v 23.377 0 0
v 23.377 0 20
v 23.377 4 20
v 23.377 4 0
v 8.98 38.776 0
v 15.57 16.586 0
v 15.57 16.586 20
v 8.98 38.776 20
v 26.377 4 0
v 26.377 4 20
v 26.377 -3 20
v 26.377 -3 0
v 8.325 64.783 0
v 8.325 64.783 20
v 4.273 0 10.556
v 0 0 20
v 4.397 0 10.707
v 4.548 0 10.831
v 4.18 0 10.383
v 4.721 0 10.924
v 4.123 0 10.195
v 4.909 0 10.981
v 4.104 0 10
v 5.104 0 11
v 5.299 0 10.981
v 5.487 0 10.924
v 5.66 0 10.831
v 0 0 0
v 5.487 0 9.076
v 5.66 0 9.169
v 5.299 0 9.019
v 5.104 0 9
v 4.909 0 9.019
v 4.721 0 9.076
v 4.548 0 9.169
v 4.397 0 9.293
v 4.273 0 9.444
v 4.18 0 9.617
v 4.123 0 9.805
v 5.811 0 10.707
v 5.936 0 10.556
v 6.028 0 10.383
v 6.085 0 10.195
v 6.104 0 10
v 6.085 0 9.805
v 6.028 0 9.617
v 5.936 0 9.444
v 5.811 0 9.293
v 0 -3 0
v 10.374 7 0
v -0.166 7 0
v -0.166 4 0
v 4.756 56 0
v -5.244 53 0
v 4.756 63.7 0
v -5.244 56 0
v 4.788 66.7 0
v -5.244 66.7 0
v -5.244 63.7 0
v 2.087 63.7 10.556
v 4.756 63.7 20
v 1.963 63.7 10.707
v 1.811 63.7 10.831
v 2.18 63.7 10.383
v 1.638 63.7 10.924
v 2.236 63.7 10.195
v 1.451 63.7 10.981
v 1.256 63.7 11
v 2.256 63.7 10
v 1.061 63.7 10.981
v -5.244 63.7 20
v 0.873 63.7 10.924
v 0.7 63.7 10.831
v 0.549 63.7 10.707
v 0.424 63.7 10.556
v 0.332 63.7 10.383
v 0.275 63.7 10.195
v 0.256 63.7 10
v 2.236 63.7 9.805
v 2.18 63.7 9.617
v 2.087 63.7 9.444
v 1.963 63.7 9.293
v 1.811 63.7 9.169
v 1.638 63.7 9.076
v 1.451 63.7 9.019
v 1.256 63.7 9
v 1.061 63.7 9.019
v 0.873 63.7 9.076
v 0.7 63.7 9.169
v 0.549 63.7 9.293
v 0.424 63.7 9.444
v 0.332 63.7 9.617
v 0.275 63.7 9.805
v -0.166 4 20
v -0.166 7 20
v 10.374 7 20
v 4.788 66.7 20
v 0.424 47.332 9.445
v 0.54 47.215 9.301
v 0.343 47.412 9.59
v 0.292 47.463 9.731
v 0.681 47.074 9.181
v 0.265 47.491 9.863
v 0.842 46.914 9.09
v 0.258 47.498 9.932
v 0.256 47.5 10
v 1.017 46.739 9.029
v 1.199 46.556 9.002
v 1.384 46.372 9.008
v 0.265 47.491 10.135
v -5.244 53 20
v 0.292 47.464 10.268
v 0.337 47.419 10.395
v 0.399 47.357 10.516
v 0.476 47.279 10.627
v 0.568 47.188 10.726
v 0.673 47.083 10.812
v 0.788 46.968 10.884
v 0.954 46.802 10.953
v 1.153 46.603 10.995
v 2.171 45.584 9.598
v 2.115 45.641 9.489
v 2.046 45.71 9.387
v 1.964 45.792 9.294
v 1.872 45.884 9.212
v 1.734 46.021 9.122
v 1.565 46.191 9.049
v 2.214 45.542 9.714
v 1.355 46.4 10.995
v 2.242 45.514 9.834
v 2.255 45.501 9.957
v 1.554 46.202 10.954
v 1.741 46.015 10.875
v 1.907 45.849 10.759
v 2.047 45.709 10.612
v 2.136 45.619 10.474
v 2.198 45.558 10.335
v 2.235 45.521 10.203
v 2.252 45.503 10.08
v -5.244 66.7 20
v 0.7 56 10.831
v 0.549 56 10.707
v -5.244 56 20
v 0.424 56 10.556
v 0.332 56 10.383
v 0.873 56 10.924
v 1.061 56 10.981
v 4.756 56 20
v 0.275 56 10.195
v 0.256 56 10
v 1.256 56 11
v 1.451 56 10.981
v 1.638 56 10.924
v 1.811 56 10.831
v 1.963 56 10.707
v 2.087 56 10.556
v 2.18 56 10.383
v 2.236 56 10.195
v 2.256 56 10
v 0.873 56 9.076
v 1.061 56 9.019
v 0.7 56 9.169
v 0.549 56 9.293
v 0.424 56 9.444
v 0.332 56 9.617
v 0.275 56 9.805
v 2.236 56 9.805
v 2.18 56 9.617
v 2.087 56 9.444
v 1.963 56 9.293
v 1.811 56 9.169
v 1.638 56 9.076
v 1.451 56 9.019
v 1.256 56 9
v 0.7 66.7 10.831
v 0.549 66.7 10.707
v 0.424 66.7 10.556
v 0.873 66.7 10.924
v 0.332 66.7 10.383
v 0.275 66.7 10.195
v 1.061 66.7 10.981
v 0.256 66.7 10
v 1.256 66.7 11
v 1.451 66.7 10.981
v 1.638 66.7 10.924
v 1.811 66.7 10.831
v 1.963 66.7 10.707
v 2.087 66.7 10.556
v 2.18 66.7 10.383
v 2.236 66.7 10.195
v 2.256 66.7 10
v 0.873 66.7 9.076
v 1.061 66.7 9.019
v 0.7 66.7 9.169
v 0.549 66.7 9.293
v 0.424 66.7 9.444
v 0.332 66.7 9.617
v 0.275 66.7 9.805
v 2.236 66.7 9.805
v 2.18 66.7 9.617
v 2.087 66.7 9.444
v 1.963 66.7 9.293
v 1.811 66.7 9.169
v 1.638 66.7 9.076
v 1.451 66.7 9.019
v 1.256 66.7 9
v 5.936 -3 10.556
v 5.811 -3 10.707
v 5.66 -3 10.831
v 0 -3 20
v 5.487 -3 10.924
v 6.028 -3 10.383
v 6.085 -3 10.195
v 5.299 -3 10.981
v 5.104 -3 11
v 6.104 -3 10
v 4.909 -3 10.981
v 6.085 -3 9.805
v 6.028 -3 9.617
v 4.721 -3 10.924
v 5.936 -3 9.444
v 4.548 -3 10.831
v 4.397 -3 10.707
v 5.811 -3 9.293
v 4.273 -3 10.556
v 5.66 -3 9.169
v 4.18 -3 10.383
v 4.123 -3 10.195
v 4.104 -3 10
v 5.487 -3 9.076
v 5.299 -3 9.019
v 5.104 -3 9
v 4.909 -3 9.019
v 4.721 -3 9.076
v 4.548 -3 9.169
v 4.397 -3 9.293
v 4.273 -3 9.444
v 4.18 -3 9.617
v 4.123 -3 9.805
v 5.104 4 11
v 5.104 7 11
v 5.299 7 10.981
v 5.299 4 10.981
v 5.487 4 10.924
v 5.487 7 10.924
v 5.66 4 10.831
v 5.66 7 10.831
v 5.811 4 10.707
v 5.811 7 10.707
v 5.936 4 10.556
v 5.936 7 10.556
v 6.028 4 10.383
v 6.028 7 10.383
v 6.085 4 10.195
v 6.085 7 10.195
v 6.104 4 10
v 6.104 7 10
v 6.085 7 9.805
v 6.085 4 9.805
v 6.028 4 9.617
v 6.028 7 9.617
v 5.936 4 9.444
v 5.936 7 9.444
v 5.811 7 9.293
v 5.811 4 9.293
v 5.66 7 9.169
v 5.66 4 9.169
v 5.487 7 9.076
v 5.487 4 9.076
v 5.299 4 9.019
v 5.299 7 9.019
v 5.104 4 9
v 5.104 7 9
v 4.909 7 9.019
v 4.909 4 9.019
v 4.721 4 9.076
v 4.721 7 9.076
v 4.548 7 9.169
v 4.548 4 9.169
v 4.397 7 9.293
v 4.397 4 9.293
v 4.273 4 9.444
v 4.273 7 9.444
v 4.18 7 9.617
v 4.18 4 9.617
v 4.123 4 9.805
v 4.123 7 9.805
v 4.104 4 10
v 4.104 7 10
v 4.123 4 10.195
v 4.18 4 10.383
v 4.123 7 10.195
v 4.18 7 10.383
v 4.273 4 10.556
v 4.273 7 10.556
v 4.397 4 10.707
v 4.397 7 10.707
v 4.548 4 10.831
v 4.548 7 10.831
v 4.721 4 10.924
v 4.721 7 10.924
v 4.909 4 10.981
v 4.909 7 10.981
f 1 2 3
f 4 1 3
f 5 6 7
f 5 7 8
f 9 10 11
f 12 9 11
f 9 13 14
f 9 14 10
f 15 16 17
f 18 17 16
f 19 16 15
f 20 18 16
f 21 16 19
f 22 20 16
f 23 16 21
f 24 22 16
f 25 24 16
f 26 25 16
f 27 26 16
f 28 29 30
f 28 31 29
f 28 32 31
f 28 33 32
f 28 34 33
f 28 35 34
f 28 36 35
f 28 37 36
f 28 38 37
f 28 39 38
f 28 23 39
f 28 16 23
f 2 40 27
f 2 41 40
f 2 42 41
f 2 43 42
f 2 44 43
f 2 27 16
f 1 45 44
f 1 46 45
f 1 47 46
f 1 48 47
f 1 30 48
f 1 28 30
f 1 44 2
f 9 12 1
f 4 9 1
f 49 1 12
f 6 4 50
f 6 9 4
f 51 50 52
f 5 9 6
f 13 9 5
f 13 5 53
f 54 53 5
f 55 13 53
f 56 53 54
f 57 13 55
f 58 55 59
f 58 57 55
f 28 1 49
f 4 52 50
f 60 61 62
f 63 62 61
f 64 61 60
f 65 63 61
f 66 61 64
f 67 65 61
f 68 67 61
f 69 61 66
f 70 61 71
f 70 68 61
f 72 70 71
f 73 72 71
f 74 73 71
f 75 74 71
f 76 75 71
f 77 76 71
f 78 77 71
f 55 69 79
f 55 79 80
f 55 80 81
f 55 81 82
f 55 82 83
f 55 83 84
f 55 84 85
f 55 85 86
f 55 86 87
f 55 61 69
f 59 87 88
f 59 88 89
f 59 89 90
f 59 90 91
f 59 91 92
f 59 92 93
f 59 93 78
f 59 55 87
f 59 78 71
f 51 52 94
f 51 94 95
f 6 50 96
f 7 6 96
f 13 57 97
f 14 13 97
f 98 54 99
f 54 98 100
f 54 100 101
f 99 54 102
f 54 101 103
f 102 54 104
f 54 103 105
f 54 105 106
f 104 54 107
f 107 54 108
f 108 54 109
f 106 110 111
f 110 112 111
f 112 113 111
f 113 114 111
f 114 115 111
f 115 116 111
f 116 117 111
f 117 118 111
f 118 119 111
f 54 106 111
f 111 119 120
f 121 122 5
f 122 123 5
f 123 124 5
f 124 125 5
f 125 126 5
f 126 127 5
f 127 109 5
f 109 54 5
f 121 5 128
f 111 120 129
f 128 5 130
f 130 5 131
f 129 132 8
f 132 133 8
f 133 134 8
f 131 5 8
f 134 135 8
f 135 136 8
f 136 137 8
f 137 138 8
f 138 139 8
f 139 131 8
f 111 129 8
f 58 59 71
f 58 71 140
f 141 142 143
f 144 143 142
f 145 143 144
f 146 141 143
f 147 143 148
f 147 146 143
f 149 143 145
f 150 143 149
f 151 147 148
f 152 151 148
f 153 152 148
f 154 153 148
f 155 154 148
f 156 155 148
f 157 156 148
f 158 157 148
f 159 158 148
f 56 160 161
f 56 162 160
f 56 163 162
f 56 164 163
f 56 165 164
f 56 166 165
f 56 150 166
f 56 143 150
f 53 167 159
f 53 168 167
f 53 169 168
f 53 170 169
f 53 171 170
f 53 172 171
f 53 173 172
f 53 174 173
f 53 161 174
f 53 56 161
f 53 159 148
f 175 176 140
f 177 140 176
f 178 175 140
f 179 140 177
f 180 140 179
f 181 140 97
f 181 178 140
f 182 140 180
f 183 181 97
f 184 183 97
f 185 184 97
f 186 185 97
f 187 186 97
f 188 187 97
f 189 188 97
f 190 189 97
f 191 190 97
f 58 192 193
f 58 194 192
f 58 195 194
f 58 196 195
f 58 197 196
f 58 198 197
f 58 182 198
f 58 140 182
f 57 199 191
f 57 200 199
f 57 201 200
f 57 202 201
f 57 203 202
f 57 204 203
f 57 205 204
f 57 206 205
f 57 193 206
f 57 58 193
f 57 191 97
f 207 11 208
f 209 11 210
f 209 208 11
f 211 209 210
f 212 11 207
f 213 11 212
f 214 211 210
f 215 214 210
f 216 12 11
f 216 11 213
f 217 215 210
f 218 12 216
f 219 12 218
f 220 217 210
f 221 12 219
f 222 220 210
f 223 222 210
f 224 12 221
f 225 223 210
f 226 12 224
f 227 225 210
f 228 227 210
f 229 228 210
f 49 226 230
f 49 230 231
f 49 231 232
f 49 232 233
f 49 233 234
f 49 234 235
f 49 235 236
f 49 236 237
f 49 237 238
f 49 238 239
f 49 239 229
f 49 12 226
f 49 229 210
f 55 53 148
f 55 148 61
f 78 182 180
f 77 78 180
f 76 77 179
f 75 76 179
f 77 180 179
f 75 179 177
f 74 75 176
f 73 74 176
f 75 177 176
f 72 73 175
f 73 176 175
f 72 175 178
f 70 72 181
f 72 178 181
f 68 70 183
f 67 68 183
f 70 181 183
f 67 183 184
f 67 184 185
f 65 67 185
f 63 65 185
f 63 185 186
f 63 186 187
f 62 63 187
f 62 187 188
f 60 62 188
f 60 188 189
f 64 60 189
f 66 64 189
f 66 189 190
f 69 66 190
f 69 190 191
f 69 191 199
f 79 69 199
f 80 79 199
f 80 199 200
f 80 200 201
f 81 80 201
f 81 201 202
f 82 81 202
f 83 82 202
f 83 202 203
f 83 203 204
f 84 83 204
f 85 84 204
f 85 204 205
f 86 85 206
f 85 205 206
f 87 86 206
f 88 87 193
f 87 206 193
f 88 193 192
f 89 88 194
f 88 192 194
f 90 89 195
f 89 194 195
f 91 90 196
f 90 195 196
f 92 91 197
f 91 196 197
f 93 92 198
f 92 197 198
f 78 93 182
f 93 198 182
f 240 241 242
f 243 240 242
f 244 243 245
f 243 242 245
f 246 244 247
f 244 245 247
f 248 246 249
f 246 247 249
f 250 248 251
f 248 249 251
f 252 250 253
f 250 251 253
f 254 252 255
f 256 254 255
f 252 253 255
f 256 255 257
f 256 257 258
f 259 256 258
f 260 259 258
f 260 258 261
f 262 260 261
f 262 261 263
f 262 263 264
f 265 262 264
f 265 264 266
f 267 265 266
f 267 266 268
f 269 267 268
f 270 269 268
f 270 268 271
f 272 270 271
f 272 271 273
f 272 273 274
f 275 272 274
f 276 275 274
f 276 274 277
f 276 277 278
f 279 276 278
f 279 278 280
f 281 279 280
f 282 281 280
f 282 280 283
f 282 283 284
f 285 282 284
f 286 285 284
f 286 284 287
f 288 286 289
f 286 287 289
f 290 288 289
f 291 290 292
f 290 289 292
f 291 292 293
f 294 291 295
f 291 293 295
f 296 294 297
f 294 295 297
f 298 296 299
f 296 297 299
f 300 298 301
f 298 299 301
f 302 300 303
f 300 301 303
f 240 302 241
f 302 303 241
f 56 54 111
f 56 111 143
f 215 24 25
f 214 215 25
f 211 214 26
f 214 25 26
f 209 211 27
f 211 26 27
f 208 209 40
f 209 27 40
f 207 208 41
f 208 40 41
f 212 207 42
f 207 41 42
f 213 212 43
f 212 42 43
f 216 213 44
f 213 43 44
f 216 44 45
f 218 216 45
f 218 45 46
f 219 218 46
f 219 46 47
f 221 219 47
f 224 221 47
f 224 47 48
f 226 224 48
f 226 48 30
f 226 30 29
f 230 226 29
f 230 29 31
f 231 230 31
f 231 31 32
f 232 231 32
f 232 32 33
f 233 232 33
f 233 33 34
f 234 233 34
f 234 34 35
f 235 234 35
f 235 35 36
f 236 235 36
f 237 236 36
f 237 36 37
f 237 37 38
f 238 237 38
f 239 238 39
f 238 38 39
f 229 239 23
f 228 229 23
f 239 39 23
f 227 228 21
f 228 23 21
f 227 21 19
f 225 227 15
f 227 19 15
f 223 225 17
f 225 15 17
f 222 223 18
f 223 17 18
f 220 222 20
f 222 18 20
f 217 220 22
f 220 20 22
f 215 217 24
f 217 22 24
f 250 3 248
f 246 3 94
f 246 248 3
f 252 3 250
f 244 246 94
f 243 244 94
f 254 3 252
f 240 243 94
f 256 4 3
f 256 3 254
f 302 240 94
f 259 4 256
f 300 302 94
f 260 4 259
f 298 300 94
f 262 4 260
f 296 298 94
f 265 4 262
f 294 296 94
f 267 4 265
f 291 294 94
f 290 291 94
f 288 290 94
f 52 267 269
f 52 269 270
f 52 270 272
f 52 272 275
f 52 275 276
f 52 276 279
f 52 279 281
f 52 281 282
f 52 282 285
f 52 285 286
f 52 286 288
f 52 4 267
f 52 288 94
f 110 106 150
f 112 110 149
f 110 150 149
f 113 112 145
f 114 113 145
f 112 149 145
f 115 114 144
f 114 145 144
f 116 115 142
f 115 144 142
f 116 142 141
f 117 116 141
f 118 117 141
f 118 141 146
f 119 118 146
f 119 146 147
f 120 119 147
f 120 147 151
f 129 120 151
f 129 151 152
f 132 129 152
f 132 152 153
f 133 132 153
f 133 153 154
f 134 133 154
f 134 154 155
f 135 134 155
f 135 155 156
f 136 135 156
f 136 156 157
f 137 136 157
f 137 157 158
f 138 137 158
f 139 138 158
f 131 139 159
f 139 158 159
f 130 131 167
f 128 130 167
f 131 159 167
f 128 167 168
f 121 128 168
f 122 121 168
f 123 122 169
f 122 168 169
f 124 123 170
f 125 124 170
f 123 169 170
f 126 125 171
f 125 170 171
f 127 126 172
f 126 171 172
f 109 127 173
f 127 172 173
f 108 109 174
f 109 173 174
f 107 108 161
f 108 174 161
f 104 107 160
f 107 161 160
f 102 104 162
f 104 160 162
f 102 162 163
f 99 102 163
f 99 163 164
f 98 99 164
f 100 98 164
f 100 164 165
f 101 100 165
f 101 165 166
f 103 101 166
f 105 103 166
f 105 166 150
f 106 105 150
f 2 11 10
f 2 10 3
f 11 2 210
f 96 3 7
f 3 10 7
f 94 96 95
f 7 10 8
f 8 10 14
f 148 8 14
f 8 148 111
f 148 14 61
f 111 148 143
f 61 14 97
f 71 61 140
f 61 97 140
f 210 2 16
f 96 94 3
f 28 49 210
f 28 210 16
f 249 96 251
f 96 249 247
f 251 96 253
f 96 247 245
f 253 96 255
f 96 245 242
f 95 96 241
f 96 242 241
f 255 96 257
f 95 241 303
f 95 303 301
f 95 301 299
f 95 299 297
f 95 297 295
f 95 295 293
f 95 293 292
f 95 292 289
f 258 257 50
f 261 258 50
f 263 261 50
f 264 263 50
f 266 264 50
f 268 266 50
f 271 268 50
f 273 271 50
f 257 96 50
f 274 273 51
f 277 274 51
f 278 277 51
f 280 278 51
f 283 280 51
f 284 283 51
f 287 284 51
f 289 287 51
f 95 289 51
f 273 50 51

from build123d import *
from OCP.BRepFilletAPI import BRepFilletAPI_MakeChamfer

# Parameters (mm, degrees)
BOSS_EXTRUDE1_DEPTH = 20
CHAMFER1_SIZE       = 10
CHAMFER1_SIZE_2     = 14.838658038
CHAMFER1_SIZE_3     = 8.042998795
SKETCH2_R           = 1
CUT_EXTRUDE1_DEPTH  = 22
SKETCH3_R           = 1
CUT_EXTRUDE2_DEPTH  = 22
CHAMFER2_SIZE       = 2
CHAMFER2_SIZE2      = 2.967731608


with BuildPart() as part:
    # Sketch1 → Boss-Extrude1 (new body)
    with BuildSketch(Plane.XY):
        Polygon((0, 0), (23.377026873, 0), (23.377026873, 4), (-0.166134072, 4), (-0.166134072, 7), (4.755655282, 7), (18.417267614, 7), (4.755655282, 53), (-5.244344718, 53), (-5.244344718, 56), (4.755655282, 56), (4.755655282, 63.7), (-5.244344718, 63.7), (-5.244344718, 66.7), (7.755655282, 66.7), (26.377026873, 4), (26.377026873, -3), (0, -3), align=None)
    extrude(amount=BOSS_EXTRUDE1_DEPTH)

    # Chamfer1
    chamfer1_edges_1 = [part.edges().sort_by_distance(p)[0] for p in [
        (4.755655282, 53, 10),
    ]]
    chamfer1_side_1 = [part.faces().sort_by_distance(p)[0] for p in [
        (4.555655282, 53, 10),
    ]]
    chamfer1_edges_2 = [part.edges().sort_by_distance(p)[0] for p in [
        (18.417267614, 7, 10),
    ]]
    chamfer1_side_2 = [part.faces().sort_by_distance(p)[0] for p in [
        (18.37147062, 7.154203007, 10),
    ]]
    chamfer1 = BRepFilletAPI_MakeChamfer(part.part.solid().wrapped)
    for e in chamfer1_edges_1:
        chamfer1.Add(CHAMFER1_SIZE - 0.0001, CHAMFER1_SIZE_2 - 0.0001, e.wrapped, chamfer1_side_1[0].wrapped)
    for e in chamfer1_edges_2:
        chamfer1.Add(CHAMFER1_SIZE - 0.0001, CHAMFER1_SIZE_3 - 0.0001, e.wrapped, chamfer1_side_2[0].wrapped)
    add(Compound.cast(chamfer1.Shape()), mode=Mode.REPLACE)  # a hair under: the kernel refuses the full size

    # Sketch2 → Cut-Extrude1 (cut)
    with BuildSketch(Plane(origin=(0, 66.7, 0), x_dir=(1, 0, 0), z_dir=(0, 1, 0))):
        with Locations(Location((1.255655282, -10, 0), (0, 0, 180))):
            Circle(SKETCH2_R)
    extrude(amount=-CUT_EXTRUDE1_DEPTH, mode=Mode.SUBTRACT)

    # Sketch3 → Cut-Extrude2 (cut)
    with BuildSketch(Plane(origin=(0, 7, 0), x_dir=(1, 0, 0), z_dir=(0, 1, 0))):
        with Locations(Location((5.104067373, -10, 0), (0, 0, 270))):
            Circle(SKETCH3_R)
    extrude(amount=-CUT_EXTRUDE2_DEPTH, mode=Mode.SUBTRACT)

    # Chamfer2
    chamfer2_edges = [part.edges().sort_by_distance(p)[0] for p in [
        (7.755655282, 66.7, 10),
    ]]
    chamfer2_side = [part.faces().sort_by_distance(p)[0] for p in [
        (17.066341078, 35.35, 10),
    ]]
    chamfer(chamfer2_edges, length=CHAMFER2_SIZE, length2=CHAMFER2_SIZE2, reference=chamfer2_side[0])


solid = part.part
